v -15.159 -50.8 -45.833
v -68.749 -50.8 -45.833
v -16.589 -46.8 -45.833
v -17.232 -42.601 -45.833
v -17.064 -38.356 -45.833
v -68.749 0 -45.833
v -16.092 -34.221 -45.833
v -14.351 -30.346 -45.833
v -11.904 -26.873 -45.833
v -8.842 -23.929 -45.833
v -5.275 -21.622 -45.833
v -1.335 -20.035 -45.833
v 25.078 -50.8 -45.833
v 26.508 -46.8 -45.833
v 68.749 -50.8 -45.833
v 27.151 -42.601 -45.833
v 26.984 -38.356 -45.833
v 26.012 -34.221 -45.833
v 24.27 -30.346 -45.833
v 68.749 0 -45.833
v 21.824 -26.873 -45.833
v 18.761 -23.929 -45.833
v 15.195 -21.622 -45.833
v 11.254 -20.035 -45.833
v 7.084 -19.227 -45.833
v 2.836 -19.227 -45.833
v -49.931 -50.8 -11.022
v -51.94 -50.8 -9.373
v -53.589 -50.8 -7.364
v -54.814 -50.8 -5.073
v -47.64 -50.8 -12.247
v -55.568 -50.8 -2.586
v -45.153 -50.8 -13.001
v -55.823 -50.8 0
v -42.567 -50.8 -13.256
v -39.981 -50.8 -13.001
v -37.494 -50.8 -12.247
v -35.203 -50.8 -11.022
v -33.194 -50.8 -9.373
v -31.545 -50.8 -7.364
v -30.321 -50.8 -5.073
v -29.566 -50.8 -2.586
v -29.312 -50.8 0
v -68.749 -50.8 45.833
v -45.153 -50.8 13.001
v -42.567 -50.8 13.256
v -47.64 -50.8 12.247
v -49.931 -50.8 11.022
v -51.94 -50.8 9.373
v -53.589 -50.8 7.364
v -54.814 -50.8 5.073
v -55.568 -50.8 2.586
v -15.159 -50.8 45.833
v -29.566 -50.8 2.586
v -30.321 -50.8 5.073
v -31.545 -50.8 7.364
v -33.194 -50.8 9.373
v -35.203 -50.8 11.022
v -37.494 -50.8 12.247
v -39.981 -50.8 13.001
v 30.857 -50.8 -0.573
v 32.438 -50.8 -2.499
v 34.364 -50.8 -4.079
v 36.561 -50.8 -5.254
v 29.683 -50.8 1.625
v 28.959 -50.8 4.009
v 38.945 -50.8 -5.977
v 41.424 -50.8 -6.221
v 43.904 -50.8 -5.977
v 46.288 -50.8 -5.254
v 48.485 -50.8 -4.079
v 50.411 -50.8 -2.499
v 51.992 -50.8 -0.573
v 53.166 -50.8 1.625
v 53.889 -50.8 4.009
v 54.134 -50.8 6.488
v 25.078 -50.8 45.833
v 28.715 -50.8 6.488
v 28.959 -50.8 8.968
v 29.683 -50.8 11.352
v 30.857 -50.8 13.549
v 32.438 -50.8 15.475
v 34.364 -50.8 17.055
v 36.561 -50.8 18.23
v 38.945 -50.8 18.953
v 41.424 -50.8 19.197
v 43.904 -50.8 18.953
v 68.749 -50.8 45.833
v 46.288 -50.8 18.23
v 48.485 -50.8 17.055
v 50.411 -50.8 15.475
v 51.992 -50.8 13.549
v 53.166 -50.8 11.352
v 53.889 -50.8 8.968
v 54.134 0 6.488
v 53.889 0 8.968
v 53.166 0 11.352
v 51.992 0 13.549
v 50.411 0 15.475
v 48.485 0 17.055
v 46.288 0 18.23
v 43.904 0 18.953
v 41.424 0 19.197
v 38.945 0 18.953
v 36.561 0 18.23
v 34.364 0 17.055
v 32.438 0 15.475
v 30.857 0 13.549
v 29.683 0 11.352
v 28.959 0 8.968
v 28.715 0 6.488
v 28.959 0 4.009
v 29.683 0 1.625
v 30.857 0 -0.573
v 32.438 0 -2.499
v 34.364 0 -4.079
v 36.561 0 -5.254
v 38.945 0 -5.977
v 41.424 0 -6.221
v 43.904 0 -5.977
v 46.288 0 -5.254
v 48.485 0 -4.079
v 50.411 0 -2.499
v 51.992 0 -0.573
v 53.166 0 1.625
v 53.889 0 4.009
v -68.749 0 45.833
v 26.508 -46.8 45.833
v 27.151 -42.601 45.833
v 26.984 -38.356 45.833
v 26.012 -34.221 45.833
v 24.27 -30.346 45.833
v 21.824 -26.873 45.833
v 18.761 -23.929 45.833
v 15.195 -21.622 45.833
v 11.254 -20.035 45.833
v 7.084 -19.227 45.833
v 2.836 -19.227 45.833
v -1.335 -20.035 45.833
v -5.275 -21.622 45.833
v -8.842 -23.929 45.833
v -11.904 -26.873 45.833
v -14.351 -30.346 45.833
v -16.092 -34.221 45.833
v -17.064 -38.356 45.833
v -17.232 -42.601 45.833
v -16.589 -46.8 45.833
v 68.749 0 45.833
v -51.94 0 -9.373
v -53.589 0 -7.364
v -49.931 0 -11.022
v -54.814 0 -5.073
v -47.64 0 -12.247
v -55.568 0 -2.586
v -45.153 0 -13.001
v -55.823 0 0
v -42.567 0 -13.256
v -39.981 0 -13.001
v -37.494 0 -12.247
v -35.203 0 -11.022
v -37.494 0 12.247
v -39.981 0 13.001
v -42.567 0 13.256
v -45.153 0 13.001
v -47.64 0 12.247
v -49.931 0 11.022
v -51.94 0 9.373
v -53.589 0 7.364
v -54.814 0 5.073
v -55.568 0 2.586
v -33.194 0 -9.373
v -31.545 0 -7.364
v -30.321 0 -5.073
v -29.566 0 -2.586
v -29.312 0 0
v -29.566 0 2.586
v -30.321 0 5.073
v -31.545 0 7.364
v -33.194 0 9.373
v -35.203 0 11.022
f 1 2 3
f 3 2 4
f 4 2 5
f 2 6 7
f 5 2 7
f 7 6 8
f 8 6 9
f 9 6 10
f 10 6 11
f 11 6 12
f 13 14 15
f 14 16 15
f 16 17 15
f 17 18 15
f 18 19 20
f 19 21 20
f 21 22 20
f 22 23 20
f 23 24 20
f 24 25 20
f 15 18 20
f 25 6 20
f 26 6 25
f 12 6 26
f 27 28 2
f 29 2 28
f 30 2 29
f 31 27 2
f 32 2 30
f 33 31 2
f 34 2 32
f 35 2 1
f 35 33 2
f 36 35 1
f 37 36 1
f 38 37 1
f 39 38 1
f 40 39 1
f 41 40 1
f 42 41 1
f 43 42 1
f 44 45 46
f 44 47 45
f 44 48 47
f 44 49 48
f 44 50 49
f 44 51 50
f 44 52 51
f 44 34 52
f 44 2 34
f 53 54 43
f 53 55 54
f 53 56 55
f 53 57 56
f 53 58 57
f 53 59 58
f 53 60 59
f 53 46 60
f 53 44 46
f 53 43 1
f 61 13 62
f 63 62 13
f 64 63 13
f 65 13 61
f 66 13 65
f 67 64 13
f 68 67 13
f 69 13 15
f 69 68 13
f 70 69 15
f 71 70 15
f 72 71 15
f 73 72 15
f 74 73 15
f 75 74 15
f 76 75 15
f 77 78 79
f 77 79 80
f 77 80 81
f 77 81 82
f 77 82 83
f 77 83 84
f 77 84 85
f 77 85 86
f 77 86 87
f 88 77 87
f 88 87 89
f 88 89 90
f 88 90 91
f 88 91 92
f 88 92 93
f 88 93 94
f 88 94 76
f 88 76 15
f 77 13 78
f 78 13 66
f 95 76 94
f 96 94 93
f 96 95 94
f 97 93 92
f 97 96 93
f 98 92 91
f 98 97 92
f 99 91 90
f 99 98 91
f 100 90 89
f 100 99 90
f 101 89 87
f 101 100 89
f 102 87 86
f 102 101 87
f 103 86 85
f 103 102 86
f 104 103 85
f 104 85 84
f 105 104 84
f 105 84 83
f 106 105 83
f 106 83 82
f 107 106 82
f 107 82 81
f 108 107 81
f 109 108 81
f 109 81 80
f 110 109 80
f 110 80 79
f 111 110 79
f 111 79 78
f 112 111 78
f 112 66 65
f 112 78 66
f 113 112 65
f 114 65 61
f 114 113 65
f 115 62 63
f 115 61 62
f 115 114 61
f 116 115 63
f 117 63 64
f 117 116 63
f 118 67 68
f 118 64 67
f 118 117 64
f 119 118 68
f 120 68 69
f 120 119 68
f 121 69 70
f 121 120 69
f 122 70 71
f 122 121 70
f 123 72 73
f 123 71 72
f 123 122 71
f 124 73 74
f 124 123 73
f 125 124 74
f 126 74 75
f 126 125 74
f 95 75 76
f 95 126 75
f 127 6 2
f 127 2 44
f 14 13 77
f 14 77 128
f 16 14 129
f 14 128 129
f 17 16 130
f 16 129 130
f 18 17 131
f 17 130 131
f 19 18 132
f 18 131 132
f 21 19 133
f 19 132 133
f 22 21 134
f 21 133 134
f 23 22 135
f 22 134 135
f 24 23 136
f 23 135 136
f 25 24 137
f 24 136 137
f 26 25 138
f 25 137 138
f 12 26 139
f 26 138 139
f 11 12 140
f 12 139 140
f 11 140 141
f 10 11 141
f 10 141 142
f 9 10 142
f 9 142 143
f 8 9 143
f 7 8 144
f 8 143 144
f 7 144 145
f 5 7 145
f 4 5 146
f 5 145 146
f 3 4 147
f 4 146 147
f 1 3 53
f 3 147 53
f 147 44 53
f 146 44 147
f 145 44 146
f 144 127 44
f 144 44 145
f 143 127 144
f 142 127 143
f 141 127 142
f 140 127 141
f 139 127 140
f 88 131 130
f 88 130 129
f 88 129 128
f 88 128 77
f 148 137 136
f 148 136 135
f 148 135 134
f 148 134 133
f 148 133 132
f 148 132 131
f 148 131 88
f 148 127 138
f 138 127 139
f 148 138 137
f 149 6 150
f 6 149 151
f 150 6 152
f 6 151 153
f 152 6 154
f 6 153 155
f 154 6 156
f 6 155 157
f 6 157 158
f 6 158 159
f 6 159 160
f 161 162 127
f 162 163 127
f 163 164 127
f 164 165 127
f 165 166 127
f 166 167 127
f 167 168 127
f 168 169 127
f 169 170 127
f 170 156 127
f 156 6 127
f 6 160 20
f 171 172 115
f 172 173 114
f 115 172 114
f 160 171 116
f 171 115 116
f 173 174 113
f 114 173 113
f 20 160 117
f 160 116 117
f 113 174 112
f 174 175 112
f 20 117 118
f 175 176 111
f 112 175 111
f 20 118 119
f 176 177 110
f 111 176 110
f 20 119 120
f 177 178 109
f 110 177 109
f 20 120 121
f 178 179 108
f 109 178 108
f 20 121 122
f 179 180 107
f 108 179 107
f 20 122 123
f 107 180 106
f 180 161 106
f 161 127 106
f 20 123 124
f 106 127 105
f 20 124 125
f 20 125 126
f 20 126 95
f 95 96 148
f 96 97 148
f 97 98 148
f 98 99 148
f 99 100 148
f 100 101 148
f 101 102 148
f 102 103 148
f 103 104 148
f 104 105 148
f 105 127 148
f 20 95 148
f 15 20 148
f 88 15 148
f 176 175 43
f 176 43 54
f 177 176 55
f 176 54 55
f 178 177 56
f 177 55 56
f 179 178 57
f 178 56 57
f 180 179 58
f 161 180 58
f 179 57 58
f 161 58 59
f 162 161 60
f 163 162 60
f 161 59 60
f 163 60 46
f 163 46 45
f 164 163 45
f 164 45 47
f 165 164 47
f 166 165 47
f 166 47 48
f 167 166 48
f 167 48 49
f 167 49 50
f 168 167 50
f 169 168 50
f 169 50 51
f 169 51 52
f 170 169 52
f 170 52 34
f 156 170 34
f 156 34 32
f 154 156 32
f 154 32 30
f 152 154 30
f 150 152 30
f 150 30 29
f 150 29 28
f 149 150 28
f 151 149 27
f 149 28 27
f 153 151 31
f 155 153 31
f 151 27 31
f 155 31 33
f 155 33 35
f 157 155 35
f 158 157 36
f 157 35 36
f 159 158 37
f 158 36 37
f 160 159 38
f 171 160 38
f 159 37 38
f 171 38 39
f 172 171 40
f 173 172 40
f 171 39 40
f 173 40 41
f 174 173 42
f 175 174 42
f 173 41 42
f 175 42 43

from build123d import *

# Parameters (mm, degrees)
F0_W       = 137.4987065792
F0_H       = 91.6657298803
F1_DEPTH   = 76.2
F3_R       = 34.4698963813
F4_DEPTH   = 76.2
F5_R       = 33.2776122009
F1_FACE1_W = 137.4987065792
F1_FACE1_H = 91.6657298803
F6_DEPTH   = 25.4
F7_R       = 29.7028077698
F8_DEPTH   = 25.4
F9_R       = 24.8229893925
F10_DEPTH  = 25.4
F11_R      = 22.2267461951
F12_DEPTH  = 127
F13_R      = 13.2555629358
F14_DEPTH  = 127
F15_R      = 12.3283716693
F16_DEPTH  = 127
F17_R      = 13.7331139198
F19_DEPTH  = 127
F21_R      = 15.0922963459
F22_DEPTH  = 127
F23_R      = 12.709116002
F24_DEPTH  = 152.4


# Not quite as in the source:
# - a feature of the source that left no trace in its solid (it failed there, or was rolled back) is left out


with BuildPart() as f1:
    # F0 (on Front) → F1 (new body)
    with BuildSketch(Plane.XZ):
        Rectangle(F0_W, F0_H)
    extrude(amount=F1_DEPTH)

    # F3 (on Front) → F4 (cut)
    with BuildSketch(Plane.XZ):
        with Locations((0, 31.9152921438)):
            Circle(F3_R)
    extrude(amount=-F4_DEPTH, mode=Mode.SUBTRACT)

    # F5 (on Front) + F1_face1 (on face) → F6 (cut)
    with BuildSketch(Plane.XZ):
        with Locations((0, 32.8243151307)):
            Circle(F5_R)
    with BuildSketch(Plane.XZ.offset(76.2)):
        Rectangle(F1_FACE1_W, F1_FACE1_H)
    extrude(amount=-F6_DEPTH, mode=Mode.SUBTRACT)

    # F7 (on Front) → F8 (cut)
    with BuildSketch(Plane.XZ):
        with Locations((0, 34.5415323973)):
            Circle(F7_R)
    extrude(amount=-F8_DEPTH, mode=Mode.SUBTRACT)

    # F9 (on Front) → F10 (cut)
    with BuildSketch(Plane.XZ):
        with Locations((0, 21.1320593953)):
            Circle(F9_R)
    extrude(amount=-F10_DEPTH, mode=Mode.SUBTRACT)

    # F11 (on face) → F12 (cut)
    with BuildSketch(Plane.XY.offset(45.8328649402)):
        with Locations((4.9597388133, -41.3516201079)):
            Circle(F11_R)
    extrude(amount=-F12_DEPTH, mode=Mode.SUBTRACT)

    # F13 (on face) → F14 (cut)
    with BuildSketch(Plane.XZ.offset(50.8)):
        with Locations((-42.5670817494, 0)):
            Circle(F13_R)
    extrude(amount=-F14_DEPTH, mode=Mode.SUBTRACT)

    # F15 (on Front) → F16 (cut)
    with BuildSketch(Plane.XZ):
        with Locations((51.0331951082, 0)):
            Circle(F15_R)
    extrude(amount=-F16_DEPTH, mode=Mode.SUBTRACT)

    # F17 (on Front) → F19 (cut)
    with BuildSketch(Plane.XZ):
        with Locations((48.1030344963, 0)):
            Circle(F17_R)
    extrude(amount=-F19_DEPTH, mode=Mode.SUBTRACT)

    # F21 (on Front) → F22 (cut)
    with BuildSketch(Plane.XZ):
        with Locations((40.081076324, 0)):
            Circle(F21_R)
    extrude(amount=-F22_DEPTH, mode=Mode.SUBTRACT)

    # F23 (on Front) → F24 (cut)
    with BuildSketch(Plane.XZ):
        with Locations((41.4244011045, 6.4881131984)):
            Circle(F23_R)
    extrude(amount=F24_DEPTH, mode=Mode.SUBTRACT)


solid = f1.part
